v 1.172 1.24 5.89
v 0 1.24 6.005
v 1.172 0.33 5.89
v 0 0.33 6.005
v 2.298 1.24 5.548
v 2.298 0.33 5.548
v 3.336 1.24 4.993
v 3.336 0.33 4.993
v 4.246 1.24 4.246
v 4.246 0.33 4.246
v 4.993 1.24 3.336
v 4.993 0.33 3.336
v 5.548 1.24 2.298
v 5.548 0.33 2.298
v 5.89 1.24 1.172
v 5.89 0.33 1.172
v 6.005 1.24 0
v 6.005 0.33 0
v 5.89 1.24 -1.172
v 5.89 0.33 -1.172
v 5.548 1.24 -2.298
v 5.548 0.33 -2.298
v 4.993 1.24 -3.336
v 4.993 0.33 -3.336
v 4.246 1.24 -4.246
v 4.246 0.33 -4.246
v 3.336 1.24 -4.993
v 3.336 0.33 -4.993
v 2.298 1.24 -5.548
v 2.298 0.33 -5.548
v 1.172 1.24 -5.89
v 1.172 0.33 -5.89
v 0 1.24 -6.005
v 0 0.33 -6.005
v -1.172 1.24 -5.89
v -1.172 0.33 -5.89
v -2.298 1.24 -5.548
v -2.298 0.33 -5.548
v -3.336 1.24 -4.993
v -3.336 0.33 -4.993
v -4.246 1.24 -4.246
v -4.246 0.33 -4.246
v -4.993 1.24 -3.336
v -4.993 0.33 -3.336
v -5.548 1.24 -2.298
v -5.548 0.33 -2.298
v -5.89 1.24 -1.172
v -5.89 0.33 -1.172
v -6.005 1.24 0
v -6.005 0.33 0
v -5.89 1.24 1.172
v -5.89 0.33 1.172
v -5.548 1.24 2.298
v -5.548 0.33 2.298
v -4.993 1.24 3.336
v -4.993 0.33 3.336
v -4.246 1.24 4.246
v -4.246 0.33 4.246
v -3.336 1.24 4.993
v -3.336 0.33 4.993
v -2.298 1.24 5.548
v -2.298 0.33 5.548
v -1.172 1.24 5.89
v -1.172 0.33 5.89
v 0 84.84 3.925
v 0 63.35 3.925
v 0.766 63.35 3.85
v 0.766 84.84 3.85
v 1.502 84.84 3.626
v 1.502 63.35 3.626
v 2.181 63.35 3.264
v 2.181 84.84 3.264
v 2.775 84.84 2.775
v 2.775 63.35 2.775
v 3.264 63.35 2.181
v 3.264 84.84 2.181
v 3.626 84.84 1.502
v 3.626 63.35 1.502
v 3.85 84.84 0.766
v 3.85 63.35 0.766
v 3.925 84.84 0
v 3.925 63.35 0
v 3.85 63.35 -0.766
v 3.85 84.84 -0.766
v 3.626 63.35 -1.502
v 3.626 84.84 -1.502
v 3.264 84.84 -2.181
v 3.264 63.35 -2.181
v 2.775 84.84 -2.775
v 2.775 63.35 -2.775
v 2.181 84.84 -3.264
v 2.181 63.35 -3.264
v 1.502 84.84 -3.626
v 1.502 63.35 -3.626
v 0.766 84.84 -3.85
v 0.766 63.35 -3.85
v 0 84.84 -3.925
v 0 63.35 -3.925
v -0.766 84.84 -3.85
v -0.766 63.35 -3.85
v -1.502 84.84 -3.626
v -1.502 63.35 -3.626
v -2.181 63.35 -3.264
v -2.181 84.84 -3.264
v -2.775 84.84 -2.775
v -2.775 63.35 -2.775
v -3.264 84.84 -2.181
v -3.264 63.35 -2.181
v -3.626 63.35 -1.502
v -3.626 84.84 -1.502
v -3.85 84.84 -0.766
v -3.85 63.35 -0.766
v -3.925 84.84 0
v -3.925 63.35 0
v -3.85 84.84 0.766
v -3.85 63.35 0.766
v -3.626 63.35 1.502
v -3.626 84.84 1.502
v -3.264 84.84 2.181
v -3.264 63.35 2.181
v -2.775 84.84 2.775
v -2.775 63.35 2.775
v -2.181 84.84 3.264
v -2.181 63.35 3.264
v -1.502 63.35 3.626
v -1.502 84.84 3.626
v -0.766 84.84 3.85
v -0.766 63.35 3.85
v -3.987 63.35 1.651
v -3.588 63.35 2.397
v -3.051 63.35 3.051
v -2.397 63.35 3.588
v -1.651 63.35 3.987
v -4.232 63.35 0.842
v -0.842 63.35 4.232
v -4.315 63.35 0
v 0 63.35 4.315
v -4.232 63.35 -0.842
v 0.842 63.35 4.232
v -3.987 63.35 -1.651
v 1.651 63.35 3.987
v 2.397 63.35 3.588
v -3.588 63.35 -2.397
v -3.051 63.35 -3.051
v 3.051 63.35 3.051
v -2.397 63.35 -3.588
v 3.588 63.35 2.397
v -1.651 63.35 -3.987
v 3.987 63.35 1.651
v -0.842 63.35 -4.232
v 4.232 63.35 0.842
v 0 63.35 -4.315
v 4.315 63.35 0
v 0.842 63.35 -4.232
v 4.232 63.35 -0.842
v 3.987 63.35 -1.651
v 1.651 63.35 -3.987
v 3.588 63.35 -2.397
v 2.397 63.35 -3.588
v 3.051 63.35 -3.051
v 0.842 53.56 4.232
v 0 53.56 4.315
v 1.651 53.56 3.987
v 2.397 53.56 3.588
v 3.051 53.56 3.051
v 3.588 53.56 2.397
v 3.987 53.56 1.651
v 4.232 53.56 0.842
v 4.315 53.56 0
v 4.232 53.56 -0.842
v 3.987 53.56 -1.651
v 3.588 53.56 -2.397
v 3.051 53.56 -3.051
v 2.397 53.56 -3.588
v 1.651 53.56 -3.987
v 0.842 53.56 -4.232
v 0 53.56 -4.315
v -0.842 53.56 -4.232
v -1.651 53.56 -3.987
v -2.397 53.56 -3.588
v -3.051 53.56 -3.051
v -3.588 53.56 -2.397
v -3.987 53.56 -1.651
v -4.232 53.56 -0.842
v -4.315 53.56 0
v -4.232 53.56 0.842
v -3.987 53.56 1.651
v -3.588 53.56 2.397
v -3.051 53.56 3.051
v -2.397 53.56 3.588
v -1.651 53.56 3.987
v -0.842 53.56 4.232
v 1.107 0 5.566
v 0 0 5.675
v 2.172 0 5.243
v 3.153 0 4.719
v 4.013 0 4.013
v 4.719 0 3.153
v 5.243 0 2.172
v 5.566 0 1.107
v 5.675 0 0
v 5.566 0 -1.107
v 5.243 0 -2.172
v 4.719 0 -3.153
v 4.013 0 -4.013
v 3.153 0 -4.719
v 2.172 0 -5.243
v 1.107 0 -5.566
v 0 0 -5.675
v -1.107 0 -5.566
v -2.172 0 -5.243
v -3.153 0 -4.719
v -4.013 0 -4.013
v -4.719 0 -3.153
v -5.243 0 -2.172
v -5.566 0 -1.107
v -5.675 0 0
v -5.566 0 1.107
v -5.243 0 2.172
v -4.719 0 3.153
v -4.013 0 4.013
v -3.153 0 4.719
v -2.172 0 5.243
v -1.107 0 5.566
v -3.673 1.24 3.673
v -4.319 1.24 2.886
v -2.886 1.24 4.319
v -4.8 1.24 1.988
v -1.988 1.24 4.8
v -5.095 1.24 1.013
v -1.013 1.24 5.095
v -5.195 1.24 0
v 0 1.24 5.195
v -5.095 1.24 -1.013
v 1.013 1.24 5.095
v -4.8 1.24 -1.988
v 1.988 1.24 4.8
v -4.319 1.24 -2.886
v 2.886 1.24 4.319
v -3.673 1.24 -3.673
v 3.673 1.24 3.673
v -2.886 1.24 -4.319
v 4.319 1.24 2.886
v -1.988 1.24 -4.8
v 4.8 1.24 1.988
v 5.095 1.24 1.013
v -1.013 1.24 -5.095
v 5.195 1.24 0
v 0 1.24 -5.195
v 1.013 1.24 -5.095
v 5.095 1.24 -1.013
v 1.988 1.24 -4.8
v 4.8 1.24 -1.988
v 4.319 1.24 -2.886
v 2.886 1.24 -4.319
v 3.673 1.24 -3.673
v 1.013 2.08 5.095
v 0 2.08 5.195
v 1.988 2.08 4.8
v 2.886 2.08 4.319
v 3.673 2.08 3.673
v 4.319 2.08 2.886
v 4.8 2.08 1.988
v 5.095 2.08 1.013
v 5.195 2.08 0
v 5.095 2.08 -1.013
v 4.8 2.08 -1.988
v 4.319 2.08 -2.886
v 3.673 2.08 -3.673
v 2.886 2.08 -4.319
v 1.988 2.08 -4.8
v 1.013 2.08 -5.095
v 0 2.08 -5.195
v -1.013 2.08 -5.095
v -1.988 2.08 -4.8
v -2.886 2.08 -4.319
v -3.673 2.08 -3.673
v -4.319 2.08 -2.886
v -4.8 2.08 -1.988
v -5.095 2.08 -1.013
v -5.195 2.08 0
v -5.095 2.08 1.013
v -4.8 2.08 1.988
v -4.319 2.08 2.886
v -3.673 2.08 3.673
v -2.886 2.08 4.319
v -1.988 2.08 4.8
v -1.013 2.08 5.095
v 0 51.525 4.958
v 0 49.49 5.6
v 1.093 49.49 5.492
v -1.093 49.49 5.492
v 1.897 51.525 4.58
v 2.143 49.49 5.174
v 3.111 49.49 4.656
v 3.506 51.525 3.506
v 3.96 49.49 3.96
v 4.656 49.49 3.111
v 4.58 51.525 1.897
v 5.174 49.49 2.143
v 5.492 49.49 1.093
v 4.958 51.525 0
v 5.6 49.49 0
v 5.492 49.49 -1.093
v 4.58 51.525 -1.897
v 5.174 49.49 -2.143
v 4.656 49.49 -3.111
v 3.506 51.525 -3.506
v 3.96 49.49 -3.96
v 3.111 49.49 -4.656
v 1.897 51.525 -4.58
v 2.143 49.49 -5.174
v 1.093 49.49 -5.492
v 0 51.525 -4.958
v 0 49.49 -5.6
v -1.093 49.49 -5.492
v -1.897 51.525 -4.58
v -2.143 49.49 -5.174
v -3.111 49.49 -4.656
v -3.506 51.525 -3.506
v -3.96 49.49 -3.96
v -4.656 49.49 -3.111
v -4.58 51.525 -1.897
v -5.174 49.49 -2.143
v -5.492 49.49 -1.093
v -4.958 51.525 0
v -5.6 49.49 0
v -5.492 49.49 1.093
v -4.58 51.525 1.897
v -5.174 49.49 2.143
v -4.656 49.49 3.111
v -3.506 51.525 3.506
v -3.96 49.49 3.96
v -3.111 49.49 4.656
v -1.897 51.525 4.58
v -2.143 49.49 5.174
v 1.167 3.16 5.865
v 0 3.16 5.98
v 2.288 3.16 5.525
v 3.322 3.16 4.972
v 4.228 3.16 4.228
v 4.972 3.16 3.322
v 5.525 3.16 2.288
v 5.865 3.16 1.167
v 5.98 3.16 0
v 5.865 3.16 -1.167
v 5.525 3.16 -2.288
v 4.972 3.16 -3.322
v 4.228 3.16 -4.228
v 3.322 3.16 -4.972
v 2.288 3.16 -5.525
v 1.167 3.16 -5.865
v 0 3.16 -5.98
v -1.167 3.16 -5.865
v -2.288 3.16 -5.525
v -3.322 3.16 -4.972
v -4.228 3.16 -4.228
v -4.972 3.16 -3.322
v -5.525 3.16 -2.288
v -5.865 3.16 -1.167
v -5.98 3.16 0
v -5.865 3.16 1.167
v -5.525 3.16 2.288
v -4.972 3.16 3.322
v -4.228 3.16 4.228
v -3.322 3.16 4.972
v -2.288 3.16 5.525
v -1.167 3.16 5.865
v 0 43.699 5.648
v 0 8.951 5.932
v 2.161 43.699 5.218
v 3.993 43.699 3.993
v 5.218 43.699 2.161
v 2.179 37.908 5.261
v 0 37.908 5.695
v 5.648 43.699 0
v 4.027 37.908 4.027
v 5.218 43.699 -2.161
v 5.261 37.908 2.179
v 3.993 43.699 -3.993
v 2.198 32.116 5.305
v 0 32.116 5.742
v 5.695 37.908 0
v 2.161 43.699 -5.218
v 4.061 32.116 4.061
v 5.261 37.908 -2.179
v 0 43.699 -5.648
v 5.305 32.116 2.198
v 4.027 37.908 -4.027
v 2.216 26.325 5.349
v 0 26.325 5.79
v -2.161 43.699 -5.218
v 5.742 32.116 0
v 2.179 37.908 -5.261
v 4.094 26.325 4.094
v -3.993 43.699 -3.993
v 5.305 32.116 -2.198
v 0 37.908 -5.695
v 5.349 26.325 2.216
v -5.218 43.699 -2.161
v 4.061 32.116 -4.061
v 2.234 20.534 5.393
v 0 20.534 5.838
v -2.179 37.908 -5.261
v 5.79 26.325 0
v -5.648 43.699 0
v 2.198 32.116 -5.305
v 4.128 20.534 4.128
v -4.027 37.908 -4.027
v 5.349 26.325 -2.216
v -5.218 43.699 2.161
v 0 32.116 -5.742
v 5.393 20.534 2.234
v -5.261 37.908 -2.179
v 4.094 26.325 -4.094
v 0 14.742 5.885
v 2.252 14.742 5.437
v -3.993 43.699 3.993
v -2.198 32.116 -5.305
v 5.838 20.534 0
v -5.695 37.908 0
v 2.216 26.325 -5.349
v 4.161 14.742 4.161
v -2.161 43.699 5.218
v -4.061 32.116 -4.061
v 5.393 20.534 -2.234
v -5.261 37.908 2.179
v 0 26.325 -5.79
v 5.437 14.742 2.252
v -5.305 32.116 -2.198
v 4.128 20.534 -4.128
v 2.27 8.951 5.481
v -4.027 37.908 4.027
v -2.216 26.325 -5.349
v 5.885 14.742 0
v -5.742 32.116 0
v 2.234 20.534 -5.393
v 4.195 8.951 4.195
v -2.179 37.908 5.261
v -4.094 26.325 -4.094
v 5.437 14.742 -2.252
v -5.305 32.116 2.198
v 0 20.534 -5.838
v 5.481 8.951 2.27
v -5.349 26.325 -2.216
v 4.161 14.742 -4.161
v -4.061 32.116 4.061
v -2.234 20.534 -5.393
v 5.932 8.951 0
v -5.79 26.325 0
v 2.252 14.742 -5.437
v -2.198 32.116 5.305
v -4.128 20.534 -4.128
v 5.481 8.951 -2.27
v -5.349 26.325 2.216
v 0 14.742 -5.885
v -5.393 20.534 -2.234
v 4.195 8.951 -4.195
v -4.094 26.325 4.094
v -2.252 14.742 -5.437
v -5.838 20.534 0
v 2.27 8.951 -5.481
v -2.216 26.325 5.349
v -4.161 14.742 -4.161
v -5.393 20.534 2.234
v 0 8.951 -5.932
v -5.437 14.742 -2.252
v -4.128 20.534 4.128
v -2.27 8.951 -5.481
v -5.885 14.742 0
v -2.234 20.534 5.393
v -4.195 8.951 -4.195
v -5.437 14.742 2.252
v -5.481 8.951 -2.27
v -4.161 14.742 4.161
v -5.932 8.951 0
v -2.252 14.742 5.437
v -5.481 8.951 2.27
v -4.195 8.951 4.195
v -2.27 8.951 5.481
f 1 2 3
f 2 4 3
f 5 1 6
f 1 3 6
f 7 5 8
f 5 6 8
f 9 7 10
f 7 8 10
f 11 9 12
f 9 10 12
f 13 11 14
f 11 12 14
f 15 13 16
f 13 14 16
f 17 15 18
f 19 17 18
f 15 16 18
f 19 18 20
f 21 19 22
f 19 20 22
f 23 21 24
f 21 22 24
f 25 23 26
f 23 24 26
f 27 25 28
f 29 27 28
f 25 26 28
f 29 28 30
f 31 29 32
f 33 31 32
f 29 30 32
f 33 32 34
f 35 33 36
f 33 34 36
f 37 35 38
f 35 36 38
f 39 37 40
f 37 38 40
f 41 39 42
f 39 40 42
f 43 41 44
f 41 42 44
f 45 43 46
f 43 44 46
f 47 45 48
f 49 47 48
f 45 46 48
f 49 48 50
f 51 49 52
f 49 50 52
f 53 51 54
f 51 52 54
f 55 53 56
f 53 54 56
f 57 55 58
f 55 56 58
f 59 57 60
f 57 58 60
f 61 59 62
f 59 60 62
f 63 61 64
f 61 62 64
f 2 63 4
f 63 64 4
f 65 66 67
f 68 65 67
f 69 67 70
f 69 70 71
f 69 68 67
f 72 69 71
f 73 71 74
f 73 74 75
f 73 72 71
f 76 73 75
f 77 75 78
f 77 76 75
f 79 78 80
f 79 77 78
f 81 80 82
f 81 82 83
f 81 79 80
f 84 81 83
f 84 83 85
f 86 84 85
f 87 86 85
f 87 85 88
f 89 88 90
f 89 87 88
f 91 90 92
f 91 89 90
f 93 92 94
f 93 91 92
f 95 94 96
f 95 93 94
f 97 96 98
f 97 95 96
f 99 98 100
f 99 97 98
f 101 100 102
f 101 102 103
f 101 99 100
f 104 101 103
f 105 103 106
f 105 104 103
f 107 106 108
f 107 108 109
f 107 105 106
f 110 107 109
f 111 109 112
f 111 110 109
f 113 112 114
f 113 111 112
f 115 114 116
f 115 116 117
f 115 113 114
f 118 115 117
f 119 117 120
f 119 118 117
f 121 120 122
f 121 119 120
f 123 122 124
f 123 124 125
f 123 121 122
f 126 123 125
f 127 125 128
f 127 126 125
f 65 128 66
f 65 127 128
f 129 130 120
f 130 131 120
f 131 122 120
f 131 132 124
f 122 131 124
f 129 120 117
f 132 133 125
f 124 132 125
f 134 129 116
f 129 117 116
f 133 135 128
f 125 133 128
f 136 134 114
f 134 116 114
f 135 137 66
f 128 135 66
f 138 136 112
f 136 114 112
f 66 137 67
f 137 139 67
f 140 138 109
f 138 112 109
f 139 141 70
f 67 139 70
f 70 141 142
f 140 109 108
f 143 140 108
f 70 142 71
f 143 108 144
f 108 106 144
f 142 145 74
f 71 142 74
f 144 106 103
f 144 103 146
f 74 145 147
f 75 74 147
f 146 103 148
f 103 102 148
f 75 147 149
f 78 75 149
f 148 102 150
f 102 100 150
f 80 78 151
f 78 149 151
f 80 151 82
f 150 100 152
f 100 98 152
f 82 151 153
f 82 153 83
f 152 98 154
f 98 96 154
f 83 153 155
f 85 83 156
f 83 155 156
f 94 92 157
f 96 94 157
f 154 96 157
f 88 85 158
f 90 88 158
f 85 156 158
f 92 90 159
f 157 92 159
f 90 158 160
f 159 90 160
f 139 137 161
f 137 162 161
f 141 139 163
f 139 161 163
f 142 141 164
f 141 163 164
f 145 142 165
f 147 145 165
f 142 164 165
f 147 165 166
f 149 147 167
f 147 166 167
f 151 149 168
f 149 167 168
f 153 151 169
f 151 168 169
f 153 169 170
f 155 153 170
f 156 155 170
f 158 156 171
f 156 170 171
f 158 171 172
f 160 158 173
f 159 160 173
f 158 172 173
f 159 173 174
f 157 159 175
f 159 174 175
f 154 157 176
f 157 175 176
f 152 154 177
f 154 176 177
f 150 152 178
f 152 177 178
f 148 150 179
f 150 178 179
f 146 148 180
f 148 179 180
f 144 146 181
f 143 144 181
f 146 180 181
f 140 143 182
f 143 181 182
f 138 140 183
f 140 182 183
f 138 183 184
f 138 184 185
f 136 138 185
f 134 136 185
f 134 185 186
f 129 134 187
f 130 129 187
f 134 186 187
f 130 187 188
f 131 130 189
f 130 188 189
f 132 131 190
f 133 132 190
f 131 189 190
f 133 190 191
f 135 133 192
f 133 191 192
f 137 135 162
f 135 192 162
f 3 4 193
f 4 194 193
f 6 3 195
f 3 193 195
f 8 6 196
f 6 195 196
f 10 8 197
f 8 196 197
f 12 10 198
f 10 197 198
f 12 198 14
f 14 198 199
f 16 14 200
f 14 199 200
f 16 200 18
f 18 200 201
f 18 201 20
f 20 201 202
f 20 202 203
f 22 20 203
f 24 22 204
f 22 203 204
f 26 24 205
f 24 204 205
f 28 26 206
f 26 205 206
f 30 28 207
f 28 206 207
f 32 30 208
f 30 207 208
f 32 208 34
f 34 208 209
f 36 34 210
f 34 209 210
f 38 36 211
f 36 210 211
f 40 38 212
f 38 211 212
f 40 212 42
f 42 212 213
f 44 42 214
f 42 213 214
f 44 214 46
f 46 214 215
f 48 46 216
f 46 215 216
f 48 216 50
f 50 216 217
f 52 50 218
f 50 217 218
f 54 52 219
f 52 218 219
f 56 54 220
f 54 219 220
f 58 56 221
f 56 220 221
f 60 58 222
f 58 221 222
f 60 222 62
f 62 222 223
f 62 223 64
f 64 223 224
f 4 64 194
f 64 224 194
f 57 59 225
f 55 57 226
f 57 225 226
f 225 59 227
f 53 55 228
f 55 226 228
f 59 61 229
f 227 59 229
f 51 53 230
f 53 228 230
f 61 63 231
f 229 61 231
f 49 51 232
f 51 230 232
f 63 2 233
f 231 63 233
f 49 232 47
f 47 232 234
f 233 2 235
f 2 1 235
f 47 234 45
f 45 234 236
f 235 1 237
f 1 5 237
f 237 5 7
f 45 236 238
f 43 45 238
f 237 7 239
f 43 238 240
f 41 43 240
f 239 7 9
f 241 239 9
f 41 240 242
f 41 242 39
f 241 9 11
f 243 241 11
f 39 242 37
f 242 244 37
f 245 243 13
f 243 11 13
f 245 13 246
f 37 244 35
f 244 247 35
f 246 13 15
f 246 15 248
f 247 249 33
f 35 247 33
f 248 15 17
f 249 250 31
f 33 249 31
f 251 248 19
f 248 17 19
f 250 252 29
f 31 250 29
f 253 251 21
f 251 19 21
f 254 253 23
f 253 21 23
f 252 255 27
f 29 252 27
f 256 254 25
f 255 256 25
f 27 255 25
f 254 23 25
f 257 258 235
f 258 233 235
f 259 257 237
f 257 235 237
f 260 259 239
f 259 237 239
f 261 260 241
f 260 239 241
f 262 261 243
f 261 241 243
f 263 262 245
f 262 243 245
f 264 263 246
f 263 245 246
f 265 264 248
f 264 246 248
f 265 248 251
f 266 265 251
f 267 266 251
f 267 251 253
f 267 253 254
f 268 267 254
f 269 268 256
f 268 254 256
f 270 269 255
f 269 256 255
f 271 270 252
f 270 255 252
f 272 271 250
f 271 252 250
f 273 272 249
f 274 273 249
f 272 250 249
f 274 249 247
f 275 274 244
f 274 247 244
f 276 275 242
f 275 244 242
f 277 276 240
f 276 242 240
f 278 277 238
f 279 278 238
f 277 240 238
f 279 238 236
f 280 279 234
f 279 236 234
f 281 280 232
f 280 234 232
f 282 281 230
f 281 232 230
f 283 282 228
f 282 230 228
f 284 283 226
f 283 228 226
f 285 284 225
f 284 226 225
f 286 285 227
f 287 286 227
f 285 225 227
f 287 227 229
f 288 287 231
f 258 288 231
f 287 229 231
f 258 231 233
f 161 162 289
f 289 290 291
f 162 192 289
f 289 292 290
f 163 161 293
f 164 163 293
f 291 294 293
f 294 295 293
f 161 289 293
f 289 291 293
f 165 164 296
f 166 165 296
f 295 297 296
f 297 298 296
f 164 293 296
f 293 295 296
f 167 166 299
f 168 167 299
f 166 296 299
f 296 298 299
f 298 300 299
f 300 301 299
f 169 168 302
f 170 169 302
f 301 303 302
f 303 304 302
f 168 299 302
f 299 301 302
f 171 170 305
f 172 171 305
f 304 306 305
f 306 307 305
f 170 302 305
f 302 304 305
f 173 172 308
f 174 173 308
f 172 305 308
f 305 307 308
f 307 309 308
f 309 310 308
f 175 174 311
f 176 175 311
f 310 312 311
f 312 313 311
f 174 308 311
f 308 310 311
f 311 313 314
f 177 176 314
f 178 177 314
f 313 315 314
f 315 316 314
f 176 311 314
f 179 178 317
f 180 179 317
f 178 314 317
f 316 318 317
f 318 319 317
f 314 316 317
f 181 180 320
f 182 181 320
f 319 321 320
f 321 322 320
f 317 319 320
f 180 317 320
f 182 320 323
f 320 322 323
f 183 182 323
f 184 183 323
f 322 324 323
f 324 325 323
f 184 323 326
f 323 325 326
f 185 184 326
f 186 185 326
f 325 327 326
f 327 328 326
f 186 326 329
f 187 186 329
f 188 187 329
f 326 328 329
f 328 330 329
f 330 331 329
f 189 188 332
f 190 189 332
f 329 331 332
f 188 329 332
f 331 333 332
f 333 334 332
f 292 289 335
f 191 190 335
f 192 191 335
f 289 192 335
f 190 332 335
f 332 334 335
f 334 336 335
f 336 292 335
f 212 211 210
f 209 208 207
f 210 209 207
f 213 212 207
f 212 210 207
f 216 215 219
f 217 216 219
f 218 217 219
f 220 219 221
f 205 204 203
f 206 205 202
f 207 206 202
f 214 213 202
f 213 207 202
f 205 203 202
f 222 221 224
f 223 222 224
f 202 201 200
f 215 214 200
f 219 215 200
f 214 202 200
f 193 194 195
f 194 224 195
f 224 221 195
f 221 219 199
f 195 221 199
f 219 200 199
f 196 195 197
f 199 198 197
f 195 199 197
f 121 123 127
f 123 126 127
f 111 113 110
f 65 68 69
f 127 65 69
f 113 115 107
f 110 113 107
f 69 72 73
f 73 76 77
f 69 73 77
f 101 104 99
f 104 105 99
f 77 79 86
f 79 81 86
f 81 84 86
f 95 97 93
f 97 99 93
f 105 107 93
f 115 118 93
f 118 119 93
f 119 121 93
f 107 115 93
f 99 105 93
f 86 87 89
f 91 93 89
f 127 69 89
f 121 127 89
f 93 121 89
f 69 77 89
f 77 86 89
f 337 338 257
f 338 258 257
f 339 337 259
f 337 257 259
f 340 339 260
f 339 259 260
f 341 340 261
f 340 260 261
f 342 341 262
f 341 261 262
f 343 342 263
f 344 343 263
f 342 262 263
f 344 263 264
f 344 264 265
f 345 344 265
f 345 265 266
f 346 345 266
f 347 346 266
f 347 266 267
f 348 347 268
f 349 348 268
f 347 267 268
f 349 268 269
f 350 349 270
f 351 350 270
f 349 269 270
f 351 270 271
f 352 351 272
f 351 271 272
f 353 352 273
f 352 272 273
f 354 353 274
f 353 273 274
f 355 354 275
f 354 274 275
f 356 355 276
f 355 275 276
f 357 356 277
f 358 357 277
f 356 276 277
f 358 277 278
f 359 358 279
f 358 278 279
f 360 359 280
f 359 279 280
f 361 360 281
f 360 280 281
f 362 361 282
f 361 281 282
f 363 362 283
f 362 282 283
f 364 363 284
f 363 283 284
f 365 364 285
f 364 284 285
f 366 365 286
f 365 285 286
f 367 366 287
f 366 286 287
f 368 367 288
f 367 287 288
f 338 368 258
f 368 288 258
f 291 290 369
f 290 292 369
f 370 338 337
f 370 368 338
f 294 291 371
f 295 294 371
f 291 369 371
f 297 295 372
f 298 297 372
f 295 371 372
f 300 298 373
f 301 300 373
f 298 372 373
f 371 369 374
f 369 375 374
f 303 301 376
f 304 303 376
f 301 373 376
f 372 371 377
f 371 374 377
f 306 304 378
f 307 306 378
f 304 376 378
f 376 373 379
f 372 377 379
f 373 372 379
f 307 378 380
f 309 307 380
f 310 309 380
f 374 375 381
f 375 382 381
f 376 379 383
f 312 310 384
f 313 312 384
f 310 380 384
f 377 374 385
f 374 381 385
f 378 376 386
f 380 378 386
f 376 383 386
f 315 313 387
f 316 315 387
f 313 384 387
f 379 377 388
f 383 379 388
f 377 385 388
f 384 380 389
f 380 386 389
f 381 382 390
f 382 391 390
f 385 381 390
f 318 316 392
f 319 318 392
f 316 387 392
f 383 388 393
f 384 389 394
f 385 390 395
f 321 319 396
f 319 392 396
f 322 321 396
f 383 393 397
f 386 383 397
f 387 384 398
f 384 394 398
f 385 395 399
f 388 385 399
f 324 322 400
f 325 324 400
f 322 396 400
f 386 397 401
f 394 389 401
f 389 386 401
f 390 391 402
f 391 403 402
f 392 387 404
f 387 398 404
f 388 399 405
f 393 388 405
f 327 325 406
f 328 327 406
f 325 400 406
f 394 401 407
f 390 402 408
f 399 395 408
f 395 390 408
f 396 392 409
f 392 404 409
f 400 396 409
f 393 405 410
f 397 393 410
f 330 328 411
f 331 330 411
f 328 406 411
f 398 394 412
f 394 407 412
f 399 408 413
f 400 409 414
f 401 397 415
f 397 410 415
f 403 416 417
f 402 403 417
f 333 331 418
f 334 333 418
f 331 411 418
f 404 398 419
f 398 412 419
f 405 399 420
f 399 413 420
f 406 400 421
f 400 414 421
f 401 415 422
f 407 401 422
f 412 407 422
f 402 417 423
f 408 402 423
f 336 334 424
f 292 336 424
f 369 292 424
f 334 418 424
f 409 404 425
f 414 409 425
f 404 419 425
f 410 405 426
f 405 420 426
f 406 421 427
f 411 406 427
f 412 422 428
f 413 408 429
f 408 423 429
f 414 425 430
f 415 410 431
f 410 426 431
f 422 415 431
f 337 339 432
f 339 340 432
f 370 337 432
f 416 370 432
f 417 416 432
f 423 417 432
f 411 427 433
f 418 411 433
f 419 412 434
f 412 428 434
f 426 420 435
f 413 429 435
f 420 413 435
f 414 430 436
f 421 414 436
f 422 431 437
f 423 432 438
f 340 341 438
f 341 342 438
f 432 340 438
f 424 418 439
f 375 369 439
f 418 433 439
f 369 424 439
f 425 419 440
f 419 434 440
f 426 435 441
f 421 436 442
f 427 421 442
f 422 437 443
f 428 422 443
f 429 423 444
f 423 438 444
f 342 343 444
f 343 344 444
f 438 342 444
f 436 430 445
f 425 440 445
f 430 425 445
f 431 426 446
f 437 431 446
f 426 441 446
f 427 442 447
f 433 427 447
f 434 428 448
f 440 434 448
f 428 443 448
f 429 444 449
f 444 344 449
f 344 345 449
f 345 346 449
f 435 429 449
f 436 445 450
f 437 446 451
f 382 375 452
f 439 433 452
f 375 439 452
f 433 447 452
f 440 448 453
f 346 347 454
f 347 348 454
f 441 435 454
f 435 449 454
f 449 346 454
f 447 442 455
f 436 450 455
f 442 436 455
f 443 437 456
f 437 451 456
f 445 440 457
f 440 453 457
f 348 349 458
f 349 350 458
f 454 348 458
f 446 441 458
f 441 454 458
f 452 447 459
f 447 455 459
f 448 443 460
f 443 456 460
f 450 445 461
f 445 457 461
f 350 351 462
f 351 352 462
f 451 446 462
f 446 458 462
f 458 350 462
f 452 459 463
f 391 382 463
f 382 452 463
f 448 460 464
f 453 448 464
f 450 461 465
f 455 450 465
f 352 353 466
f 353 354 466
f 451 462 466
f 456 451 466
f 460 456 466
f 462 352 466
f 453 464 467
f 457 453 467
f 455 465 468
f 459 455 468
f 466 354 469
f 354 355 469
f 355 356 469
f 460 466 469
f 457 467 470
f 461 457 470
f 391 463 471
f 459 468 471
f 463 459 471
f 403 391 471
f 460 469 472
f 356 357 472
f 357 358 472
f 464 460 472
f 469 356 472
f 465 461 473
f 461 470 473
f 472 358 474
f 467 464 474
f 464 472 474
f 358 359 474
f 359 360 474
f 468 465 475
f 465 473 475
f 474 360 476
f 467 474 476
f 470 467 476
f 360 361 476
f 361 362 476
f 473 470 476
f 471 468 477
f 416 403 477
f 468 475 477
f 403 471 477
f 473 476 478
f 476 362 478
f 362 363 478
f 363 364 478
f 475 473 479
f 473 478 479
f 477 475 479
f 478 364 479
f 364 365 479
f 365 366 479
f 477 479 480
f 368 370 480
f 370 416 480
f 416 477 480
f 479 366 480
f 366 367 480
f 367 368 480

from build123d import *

# Parameters (mm, degrees)
F0_W = 21.49
F0_H = 3.925


with BuildPart() as f1:
    # F0 (on Right) → F1 (revolve)
    with BuildSketch(Plane.YZ):
        Polygon((0, 5.675), (0, 0), (0.33, 0), (0.33, 6.005), align=None)
        Polygon((0.33, 6.005), (0.33, 0), (1.24, 0), (2.08, 0), (2.08, 5.195), (1.24, 5.195), (1.24, 6.005), align=None)
        Polygon((2.08, 5.195), (2.08, 0), (3.16, 0), (3.16, 5.98), align=None)
        Polygon((3.16, 5.98), (3.16, 0), (49.49, 0), (49.49, 5.6), align=None)
        Polygon((49.49, 5.6), (49.49, 0), (53.56, 0), (63.35, 0), (63.35, 3.925), (63.35, 4.3153), (53.56, 4.3153), align=None)
        with Locations((74.095, 1.9625)):
            Rectangle(F0_W, F0_H)
    revolve(axis=Axis((0, 26.325, 0), (0, 1, 0)))


solid = f1.part
